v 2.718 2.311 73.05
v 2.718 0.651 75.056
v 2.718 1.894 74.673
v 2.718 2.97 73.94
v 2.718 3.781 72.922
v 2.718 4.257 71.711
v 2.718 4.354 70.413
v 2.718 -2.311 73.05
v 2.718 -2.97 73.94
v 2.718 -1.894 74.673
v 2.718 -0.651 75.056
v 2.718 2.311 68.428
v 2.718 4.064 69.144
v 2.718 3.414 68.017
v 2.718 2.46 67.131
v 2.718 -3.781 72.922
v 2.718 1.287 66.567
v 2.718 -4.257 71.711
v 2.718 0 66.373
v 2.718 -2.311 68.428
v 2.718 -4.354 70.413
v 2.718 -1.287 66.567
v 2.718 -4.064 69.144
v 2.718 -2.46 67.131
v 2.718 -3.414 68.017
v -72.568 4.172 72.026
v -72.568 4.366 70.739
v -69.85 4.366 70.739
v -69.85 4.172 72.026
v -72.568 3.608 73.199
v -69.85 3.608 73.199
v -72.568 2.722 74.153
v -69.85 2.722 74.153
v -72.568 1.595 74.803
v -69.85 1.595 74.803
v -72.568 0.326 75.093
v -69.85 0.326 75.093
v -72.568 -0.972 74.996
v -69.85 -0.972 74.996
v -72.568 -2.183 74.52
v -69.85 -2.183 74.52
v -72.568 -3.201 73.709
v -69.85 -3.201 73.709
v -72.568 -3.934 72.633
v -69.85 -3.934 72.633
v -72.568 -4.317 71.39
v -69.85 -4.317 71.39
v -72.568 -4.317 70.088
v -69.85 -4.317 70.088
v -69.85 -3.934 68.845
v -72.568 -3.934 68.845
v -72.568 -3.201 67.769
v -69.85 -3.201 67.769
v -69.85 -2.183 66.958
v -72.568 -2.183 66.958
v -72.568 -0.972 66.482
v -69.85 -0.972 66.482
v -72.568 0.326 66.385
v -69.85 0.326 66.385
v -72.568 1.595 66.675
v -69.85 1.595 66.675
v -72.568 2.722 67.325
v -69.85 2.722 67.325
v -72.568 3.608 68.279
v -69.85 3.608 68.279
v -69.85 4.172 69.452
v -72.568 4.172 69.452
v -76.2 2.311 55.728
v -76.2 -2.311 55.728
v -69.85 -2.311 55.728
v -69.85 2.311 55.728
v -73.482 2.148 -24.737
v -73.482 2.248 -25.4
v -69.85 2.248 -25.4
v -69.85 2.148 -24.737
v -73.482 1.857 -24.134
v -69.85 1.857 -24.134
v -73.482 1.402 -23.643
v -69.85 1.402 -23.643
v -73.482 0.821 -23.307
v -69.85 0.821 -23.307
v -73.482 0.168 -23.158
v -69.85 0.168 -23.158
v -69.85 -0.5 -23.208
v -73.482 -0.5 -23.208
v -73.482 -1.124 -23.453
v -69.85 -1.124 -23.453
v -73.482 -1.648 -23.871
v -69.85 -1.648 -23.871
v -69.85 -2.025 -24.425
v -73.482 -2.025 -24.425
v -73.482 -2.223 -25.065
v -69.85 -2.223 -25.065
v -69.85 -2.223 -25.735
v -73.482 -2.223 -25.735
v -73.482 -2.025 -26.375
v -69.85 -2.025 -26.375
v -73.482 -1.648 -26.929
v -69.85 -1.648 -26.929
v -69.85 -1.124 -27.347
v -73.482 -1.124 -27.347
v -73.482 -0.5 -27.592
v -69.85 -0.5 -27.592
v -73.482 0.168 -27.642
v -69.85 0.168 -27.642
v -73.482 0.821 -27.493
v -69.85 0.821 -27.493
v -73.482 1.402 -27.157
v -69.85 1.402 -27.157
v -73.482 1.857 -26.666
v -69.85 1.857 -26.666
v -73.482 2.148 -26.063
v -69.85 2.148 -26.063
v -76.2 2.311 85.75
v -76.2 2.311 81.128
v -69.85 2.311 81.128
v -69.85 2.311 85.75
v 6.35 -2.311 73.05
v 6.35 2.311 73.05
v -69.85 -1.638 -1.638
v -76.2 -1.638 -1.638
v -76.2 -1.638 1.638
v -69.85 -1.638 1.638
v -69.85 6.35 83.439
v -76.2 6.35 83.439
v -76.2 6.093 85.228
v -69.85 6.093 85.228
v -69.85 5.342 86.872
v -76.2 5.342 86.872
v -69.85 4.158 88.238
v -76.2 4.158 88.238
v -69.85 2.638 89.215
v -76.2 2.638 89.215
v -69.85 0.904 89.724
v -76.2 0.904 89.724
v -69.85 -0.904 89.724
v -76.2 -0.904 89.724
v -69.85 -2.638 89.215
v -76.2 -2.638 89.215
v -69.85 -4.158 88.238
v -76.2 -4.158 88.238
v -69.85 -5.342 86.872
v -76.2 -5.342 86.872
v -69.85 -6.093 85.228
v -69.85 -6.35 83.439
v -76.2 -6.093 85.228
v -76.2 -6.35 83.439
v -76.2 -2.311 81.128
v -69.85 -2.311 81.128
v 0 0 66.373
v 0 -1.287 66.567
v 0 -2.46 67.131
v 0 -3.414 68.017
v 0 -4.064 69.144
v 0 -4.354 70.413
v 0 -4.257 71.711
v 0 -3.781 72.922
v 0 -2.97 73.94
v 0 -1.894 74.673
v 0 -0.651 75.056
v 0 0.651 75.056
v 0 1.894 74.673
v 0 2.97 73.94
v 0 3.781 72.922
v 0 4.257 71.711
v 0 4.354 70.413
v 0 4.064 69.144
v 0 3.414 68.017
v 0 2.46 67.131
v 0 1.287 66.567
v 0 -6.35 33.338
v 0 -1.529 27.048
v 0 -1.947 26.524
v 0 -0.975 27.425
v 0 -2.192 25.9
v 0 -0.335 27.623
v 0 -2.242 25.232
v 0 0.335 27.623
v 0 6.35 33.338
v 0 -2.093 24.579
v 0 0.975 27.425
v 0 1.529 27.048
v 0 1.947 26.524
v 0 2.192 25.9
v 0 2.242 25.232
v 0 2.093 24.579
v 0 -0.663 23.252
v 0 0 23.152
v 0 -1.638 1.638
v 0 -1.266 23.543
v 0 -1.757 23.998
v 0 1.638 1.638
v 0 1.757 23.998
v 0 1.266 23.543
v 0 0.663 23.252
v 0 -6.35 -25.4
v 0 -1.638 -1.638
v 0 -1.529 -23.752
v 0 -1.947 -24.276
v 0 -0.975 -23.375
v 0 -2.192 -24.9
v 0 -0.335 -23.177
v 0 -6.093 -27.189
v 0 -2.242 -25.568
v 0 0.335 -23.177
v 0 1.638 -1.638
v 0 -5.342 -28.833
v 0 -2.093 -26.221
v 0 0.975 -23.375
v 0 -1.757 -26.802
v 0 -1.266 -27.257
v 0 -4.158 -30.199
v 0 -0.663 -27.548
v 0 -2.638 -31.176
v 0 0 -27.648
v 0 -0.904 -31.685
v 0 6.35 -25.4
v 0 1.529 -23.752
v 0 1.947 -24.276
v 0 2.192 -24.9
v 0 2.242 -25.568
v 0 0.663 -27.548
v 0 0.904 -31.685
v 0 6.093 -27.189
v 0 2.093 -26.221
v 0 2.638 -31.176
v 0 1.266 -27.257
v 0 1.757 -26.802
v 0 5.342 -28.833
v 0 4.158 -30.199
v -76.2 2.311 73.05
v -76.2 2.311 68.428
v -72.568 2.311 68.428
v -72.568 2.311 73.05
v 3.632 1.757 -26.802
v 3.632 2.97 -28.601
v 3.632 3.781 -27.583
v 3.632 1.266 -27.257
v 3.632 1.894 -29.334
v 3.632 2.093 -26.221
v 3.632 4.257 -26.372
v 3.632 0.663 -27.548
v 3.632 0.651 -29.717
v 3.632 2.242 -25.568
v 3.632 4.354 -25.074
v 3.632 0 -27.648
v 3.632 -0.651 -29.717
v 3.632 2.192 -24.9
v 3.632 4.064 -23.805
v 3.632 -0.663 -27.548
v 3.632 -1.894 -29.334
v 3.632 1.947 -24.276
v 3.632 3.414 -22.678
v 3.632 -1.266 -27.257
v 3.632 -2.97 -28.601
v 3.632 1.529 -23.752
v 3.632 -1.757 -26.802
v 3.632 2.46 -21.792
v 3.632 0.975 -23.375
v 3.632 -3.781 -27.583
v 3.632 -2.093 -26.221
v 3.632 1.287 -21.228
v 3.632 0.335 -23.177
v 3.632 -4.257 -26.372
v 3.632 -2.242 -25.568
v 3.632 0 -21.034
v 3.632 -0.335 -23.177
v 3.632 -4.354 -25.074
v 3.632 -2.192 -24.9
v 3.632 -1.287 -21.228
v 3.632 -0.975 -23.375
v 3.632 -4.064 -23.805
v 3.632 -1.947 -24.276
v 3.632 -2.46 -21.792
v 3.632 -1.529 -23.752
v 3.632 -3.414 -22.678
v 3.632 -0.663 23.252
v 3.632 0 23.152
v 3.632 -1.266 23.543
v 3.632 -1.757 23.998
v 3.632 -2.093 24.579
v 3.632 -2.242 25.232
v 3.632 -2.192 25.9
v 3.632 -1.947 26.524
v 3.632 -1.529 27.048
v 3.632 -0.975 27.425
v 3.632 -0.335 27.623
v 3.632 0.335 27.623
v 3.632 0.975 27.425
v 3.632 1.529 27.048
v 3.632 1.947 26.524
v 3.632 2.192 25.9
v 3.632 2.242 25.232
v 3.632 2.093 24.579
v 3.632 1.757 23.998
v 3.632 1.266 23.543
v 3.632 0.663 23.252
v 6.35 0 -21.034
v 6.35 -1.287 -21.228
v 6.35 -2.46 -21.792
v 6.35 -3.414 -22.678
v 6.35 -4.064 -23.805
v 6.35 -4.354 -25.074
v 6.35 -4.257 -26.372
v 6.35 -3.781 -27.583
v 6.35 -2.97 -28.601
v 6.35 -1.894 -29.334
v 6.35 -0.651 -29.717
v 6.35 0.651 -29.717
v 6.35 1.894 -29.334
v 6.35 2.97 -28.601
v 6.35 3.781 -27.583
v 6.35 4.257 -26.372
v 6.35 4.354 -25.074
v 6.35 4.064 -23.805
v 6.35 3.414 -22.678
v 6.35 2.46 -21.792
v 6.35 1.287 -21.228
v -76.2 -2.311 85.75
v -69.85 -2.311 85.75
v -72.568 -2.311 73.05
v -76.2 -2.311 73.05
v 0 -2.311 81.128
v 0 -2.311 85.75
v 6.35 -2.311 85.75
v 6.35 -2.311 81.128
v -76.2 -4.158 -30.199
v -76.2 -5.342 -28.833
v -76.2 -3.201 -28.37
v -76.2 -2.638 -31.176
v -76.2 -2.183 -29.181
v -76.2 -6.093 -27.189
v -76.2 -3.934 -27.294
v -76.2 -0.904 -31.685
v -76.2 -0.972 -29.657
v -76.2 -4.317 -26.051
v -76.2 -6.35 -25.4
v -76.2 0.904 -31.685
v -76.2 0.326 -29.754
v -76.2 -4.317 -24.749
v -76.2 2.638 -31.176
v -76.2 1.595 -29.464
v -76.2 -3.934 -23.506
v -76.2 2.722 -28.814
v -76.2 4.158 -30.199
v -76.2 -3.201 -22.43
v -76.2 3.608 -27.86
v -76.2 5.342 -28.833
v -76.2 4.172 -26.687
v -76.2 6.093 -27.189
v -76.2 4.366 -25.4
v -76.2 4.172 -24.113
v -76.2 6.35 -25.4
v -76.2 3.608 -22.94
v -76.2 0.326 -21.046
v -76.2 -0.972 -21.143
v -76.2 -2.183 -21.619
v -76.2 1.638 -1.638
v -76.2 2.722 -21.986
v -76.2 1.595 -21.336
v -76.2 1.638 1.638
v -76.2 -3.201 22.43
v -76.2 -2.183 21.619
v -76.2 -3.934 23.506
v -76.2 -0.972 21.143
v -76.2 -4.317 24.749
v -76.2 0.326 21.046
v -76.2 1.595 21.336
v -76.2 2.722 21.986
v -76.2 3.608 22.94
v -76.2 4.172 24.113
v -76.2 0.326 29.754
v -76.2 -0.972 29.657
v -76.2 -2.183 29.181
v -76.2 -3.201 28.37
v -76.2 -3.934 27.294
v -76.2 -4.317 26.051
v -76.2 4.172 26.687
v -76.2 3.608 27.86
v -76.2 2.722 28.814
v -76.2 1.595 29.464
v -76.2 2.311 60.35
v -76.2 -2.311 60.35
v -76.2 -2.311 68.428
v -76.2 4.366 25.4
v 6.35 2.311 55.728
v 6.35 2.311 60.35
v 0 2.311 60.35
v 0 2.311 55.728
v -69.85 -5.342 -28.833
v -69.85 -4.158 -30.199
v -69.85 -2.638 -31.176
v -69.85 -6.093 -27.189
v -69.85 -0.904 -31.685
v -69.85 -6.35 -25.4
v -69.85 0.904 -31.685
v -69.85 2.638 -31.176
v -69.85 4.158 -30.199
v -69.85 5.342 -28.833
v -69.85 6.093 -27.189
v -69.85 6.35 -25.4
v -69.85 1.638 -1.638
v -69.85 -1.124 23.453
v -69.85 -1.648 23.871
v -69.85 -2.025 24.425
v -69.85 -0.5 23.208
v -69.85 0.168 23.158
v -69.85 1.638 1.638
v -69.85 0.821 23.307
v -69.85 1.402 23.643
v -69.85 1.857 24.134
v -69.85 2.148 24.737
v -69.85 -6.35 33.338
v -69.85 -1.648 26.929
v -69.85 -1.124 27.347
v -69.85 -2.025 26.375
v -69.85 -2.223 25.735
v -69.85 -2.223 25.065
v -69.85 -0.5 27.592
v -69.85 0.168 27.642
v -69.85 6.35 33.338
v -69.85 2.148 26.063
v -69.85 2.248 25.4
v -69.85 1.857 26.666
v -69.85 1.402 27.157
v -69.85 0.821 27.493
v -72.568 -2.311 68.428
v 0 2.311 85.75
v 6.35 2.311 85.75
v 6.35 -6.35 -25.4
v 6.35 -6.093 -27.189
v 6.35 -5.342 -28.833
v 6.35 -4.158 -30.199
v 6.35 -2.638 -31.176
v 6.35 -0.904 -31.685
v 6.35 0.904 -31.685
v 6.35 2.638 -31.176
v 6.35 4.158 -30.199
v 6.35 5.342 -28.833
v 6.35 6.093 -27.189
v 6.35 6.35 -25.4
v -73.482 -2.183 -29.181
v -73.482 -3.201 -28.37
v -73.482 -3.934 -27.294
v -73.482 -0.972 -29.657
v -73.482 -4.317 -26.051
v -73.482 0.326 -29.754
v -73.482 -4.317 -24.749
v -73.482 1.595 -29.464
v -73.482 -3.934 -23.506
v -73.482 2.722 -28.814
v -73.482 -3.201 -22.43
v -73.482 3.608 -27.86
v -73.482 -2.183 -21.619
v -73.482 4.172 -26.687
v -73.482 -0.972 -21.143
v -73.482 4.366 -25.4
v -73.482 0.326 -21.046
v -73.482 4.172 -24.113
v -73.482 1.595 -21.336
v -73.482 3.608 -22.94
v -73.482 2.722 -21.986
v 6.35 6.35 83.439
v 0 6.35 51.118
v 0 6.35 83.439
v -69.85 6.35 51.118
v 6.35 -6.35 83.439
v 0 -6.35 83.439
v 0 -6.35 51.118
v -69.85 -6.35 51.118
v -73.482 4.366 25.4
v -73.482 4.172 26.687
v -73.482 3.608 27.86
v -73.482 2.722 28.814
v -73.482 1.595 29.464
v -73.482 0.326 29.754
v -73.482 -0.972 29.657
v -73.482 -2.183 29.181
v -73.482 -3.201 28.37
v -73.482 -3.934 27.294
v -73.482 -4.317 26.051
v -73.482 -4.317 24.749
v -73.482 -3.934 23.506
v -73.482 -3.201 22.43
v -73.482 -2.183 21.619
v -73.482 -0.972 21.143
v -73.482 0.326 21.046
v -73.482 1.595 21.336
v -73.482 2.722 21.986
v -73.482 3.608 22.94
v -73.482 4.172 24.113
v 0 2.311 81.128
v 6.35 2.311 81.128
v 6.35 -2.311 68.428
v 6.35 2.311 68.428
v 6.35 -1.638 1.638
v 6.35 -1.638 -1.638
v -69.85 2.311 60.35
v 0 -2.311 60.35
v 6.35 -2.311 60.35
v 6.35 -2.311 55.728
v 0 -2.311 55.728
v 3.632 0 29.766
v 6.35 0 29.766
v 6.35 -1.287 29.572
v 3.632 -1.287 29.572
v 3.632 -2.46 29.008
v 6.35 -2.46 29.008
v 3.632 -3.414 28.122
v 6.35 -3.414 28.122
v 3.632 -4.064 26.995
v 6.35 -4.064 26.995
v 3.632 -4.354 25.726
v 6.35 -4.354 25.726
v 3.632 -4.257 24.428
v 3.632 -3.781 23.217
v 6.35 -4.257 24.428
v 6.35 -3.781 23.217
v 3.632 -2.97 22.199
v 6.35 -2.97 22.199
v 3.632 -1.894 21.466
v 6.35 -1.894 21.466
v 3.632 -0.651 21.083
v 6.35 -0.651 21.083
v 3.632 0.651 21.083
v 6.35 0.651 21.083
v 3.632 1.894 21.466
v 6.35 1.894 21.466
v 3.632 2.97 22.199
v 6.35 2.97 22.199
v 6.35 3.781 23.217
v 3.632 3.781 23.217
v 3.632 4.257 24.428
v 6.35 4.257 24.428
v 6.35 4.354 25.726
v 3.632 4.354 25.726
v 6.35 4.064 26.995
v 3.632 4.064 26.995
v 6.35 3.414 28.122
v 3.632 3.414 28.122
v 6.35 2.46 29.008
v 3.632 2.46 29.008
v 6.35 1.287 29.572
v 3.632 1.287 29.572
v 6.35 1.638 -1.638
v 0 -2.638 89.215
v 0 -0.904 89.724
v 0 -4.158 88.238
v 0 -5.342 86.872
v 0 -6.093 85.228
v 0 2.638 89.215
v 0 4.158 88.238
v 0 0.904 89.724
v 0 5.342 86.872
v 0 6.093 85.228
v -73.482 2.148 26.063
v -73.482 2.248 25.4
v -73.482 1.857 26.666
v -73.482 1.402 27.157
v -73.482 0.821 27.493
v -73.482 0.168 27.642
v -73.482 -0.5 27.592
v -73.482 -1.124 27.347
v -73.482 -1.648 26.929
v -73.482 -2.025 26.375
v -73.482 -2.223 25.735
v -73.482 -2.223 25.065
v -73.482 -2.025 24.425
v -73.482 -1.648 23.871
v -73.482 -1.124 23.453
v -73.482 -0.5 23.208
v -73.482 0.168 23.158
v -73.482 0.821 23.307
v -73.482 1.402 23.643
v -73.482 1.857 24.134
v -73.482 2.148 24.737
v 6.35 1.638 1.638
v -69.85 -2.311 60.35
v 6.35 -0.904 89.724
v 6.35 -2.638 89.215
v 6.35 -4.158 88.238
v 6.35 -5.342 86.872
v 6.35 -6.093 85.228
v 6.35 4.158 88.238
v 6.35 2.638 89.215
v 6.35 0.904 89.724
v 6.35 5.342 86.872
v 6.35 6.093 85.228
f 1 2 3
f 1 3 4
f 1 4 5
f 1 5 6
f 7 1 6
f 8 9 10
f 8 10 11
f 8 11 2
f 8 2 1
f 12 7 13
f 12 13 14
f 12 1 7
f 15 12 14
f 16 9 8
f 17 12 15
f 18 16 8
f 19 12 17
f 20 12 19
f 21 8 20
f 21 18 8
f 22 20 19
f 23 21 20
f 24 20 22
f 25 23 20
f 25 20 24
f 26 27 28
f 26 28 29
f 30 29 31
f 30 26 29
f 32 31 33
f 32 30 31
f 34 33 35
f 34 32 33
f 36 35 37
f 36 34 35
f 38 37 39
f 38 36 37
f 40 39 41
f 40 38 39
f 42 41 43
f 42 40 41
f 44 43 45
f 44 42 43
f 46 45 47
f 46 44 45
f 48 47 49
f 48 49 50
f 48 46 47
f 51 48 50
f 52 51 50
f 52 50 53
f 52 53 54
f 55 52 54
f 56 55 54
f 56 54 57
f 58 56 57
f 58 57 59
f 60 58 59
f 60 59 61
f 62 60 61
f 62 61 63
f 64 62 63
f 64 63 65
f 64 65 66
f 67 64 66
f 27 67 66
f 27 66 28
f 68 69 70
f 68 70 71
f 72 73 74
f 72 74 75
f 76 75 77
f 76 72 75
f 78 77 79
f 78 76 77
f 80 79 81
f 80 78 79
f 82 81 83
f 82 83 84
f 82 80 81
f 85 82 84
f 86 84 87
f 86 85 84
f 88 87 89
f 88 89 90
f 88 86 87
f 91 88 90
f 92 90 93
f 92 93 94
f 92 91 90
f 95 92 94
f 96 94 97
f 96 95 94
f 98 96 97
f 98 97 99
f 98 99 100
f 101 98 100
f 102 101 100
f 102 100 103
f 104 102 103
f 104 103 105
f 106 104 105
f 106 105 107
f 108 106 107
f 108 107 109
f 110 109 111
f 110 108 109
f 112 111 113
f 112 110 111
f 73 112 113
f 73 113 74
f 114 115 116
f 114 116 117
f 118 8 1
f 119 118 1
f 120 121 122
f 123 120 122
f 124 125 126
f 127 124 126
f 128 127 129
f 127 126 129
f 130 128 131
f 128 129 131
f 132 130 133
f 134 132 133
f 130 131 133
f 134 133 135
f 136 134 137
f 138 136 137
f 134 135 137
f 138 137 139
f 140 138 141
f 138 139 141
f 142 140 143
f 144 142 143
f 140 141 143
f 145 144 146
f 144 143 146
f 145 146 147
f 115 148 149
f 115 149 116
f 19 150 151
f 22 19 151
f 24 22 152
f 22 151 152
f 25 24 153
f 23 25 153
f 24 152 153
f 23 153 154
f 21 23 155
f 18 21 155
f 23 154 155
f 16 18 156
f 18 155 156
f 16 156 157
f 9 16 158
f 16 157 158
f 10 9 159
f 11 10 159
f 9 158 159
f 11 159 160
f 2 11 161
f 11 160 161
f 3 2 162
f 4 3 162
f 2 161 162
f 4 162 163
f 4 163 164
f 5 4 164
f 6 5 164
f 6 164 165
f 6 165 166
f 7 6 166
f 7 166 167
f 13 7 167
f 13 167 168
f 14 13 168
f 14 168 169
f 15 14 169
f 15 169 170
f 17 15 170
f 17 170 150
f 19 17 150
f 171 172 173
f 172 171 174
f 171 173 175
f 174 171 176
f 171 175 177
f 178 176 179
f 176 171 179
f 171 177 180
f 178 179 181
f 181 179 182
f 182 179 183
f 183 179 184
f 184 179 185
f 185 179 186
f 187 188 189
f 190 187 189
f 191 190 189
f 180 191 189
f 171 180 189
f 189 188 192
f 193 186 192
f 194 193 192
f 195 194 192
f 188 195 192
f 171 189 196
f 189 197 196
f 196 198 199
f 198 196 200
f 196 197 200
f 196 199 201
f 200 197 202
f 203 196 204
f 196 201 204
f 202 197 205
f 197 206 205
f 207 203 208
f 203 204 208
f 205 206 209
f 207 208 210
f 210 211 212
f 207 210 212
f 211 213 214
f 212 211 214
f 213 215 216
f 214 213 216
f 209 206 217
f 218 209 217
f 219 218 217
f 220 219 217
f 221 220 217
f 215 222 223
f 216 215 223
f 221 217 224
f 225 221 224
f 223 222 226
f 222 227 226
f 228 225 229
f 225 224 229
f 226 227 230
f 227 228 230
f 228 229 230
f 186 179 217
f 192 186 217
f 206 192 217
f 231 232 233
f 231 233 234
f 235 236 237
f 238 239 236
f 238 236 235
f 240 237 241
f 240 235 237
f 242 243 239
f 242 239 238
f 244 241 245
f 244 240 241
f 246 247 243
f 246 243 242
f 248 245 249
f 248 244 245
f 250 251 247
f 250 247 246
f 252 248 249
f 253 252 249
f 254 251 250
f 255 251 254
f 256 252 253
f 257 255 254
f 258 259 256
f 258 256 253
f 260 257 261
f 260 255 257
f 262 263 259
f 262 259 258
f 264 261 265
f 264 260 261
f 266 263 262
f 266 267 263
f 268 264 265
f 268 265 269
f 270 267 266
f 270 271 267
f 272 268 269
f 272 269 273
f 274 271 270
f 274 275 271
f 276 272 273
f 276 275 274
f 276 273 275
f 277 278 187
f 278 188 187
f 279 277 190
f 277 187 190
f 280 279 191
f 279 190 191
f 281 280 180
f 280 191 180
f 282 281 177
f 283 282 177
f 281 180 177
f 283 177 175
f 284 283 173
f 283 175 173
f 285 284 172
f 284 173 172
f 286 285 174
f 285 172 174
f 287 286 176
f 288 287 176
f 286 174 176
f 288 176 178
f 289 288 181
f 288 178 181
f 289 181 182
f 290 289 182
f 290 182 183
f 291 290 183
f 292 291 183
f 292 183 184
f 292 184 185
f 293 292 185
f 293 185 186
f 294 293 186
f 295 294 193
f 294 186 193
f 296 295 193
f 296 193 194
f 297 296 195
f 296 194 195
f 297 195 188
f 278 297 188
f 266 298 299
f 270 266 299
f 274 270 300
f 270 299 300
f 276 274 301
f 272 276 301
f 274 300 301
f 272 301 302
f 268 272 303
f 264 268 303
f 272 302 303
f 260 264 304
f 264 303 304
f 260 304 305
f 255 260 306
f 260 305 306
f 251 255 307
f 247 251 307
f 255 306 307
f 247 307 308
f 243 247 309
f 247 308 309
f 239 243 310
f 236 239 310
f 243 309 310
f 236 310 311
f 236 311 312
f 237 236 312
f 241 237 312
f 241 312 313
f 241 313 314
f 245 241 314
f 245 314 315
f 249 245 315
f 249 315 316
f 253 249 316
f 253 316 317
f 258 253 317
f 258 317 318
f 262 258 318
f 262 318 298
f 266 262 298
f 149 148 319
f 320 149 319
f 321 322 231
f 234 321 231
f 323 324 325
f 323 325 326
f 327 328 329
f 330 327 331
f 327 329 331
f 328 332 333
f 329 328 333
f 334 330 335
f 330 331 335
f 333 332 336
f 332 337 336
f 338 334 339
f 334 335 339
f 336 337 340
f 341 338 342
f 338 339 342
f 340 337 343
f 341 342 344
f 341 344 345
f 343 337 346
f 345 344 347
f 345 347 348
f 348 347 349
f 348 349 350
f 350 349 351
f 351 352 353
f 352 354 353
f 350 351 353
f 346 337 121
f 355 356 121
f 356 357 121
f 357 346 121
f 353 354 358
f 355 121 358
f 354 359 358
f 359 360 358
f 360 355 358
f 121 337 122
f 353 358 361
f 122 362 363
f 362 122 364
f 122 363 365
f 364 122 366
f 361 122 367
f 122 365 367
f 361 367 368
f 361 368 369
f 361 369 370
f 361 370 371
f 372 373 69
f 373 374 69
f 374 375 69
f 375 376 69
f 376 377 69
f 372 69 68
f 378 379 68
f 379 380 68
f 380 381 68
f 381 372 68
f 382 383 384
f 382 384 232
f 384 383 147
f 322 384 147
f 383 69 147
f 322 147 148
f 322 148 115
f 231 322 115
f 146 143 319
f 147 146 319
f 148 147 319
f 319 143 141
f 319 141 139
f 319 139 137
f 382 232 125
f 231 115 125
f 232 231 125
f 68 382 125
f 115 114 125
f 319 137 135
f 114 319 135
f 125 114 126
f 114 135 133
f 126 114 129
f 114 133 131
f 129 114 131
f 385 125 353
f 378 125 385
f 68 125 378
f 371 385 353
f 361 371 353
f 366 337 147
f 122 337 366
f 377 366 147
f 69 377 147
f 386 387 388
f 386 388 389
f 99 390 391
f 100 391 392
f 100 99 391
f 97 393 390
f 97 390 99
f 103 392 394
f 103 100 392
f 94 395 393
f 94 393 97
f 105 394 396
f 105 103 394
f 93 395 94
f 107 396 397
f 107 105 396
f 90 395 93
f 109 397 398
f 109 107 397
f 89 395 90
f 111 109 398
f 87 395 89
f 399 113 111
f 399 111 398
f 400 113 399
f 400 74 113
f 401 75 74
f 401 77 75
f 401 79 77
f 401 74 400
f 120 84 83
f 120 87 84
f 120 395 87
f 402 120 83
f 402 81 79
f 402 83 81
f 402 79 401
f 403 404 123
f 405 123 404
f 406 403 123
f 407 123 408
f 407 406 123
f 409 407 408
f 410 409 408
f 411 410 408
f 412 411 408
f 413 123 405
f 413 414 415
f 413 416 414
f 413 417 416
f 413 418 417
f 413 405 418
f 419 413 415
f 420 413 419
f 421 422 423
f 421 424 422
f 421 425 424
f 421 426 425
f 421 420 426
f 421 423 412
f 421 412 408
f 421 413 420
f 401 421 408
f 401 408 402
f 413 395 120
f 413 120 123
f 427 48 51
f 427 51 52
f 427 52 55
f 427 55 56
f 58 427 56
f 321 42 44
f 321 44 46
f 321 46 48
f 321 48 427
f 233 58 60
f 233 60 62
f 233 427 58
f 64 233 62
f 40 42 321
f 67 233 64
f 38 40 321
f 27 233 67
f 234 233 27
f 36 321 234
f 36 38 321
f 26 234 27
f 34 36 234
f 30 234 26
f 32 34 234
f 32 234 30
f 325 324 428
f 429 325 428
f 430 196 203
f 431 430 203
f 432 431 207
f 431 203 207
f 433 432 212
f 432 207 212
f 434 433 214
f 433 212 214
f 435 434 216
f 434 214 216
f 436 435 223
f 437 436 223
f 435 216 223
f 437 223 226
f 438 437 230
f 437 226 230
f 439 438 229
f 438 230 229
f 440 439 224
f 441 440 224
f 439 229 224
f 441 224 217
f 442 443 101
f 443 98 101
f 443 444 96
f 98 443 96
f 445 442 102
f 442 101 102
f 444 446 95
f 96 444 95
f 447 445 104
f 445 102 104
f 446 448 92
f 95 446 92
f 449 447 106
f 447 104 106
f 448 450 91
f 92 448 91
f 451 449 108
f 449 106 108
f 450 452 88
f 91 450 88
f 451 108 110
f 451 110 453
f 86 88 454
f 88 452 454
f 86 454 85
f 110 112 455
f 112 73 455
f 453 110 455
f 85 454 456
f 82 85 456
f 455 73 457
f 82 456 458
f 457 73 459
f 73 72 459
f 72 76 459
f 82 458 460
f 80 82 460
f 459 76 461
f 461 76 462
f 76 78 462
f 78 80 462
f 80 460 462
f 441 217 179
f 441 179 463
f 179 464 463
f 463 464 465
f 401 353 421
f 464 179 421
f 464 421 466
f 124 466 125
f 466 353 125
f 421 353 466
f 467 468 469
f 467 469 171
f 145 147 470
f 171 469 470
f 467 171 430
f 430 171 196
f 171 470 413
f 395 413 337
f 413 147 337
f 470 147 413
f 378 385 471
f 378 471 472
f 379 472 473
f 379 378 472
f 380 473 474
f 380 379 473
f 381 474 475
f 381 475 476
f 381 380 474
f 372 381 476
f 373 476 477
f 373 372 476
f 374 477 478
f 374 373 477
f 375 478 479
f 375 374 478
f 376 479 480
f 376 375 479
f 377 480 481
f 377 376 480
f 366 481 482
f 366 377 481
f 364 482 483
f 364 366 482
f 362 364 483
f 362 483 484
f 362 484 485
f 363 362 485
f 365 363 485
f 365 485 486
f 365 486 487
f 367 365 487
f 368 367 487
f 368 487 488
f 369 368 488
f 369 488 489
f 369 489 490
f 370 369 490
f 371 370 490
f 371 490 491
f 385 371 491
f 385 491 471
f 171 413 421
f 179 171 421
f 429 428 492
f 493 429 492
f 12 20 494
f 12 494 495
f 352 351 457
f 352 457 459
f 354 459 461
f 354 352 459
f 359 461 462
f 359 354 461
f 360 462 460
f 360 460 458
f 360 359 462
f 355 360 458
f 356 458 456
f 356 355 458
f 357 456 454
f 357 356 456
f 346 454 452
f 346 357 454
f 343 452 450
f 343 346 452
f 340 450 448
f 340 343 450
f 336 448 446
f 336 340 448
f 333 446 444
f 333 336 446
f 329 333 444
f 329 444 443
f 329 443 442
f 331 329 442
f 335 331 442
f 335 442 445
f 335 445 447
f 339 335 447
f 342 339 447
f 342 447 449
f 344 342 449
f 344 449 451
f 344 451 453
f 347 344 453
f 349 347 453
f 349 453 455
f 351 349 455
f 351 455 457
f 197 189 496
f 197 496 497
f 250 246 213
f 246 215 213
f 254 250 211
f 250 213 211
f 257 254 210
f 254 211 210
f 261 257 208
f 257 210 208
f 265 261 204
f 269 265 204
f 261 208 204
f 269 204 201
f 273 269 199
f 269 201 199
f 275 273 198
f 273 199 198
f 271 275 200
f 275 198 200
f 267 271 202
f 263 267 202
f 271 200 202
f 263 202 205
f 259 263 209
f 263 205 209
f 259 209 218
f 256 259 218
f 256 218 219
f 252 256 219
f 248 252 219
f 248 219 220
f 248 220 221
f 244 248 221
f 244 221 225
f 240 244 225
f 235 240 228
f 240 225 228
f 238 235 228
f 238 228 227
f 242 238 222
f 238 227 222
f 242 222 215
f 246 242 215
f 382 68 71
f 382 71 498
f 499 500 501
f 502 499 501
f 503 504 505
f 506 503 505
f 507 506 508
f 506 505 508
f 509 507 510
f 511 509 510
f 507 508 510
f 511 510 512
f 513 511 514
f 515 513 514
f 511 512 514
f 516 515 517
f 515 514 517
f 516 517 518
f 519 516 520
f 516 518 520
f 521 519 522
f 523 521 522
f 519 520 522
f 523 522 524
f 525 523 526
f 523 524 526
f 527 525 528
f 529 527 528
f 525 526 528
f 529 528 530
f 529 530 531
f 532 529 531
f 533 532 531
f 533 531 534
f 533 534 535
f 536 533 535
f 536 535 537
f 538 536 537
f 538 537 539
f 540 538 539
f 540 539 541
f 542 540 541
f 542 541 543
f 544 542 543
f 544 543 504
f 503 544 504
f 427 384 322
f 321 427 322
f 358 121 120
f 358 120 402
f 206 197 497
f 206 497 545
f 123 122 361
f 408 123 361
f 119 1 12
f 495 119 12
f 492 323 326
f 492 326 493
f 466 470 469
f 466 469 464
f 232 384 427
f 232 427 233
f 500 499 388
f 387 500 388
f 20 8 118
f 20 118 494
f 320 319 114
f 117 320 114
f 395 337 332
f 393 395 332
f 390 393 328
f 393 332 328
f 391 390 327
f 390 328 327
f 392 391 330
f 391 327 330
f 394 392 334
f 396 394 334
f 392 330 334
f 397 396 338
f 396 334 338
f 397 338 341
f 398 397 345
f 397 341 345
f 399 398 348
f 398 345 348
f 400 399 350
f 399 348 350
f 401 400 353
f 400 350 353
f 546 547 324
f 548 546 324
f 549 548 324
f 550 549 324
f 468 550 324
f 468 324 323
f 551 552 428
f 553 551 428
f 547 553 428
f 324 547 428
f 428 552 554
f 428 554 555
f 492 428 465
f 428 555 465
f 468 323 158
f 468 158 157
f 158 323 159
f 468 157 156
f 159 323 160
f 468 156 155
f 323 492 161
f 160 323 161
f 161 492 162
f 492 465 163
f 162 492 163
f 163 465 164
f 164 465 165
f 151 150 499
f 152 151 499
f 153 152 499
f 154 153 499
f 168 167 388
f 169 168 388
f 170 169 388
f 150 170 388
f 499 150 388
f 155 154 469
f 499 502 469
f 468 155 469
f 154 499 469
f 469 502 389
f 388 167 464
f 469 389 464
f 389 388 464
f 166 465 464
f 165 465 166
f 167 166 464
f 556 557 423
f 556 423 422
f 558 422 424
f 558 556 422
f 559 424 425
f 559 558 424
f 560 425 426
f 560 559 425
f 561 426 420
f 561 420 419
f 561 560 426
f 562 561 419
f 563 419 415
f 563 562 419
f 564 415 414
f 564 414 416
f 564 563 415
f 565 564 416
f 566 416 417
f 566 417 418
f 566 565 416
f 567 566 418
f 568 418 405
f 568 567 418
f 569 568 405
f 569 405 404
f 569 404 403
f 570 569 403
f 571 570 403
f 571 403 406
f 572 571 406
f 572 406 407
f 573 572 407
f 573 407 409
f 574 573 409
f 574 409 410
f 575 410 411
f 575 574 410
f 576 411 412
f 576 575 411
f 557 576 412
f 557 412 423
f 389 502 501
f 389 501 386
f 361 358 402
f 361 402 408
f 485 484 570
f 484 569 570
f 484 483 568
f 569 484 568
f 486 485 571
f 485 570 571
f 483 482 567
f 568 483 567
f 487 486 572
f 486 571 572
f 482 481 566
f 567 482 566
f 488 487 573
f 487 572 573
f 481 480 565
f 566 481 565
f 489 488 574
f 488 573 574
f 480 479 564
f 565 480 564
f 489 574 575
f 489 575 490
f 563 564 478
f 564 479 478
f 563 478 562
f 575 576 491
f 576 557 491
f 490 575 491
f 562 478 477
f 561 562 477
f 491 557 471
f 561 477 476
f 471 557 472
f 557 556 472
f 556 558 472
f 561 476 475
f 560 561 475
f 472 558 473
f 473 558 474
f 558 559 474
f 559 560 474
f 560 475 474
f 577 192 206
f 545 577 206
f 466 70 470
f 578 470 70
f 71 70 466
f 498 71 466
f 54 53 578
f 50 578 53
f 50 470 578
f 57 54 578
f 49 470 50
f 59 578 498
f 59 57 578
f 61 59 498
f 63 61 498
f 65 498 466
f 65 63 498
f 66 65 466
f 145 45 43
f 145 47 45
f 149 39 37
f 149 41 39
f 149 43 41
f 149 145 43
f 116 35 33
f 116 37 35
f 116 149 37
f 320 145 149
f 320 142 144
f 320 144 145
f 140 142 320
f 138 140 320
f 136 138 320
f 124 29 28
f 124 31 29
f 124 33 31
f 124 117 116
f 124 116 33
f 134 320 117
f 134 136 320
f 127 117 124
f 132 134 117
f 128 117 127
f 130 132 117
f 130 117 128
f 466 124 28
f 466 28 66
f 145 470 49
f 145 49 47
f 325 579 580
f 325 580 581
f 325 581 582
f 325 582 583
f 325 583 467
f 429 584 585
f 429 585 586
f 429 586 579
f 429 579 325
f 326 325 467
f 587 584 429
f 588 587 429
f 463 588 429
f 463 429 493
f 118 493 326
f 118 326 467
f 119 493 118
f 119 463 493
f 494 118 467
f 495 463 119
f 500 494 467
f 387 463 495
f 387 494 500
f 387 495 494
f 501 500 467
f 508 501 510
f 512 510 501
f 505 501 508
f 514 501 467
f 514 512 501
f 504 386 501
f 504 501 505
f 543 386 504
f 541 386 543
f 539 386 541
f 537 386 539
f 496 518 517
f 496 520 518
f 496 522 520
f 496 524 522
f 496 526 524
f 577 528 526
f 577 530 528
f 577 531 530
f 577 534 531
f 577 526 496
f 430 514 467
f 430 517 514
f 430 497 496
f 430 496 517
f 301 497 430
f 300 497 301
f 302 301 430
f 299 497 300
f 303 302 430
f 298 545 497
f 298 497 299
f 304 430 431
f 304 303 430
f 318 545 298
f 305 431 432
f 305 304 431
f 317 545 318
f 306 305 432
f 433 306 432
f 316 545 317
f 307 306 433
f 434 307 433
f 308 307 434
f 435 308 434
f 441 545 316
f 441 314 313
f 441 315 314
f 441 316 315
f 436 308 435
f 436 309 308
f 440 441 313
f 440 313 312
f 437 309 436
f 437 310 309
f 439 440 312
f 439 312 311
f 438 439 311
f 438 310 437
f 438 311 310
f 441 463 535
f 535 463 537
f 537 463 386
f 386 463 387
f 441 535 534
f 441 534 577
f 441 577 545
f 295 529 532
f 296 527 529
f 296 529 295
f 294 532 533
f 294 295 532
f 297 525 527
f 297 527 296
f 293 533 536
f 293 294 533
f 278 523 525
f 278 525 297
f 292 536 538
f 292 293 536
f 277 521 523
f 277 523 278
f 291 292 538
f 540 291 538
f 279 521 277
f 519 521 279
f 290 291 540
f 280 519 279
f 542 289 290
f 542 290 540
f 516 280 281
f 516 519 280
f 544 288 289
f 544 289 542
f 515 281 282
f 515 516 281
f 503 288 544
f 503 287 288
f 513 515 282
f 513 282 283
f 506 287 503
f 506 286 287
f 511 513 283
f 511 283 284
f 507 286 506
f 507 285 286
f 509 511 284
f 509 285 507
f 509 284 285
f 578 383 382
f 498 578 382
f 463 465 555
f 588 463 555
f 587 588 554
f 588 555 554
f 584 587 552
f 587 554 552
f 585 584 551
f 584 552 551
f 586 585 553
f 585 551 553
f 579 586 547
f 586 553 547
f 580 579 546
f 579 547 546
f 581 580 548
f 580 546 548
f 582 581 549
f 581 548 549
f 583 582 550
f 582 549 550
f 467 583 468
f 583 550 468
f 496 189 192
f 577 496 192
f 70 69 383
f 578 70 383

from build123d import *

# Parameters (mm, degrees)
SKETCH1_W                                      = 3.275
SKETCH1_H                                      = 3.275
SKETCH1_W_2                                    = 4.6228
SKETCH1_H_2                                    = 4.6228
BOSS_EXTRUDE1_DEPTH                            = 6.35
CBORE_FOR_8_BUTTON_HEAD_CAP_SCREW1_D           = 4.4958
CBORE_FOR_8_BUTTON_HEAD_CAP_SCREW1_CBORE_D     = 8.73252
CBORE_FOR_8_BUTTON_HEAD_CAP_SCREW1_CBORE_DEPTH = 2.7178
CBORE_FOR_8_BUTTON_HEAD_CAP_SCREW2_D           = 4.4958
CBORE_FOR_8_BUTTON_HEAD_CAP_SCREW2_CBORE_D     = 8.73252
CBORE_FOR_8_BUTTON_HEAD_CAP_SCREW2_CBORE_DEPTH = 2.7178
SKETCH10_W                                     = 17.78
SKETCH10_H                                     = 12.7
BOSS_EXTRUDE2_DEPTH                            = 38.1
MIRROR5_START                                  = -76.2
MIRROR5_OUTLINE_R                              = 4.36626
MIRROR5_OUTLINE_W                              = 3.275
MIRROR5_OUTLINE_H                              = 3.275
MIRROR5_OUTLINE_W_2                            = 4.6228
MIRROR5_OUTLINE_H_2                            = 4.6228
MIRROR5_DEPTH                                  = 6.35
MIRROR5_START_2                                = -73.4822
MIRROR5_2_OUTLINE_R                            = 4.36626
MIRROR5_2_OUTLINE_R_2                          = 2.2479
MIRROR5_2_DEPTH                                = 3.6322
MIRROR5_3_OUTLINE_R                            = 4.36626
MIRROR5_3_OUTLINE_W                            = 4.6228
MIRROR5_3_OUTLINE_H                            = 4.6228
MIRROR5_3_DEPTH                                = 3.6322


# Read off the part's stored shape, not the designer's step: Mirror5
with BuildPart() as part:
    # Sketch1 → Boss-Extrude1 (new body)
    with BuildSketch(Plane(origin=(0, 0, 0), x_dir=(0, 0, -1), z_dir=(1, 0, 0))):
        with BuildLine():
            Line((-83.439, -6.35), (25.4, -6.35))
            ThreePointArc((25.4, -6.35), (31.75, 0), (25.4, 6.35))
            Line((25.4, 6.35), (-83.439, 6.35))
            ThreePointArc((-83.439, 6.35), (-89.789, 0), (-83.439, -6.35))
        make_face()
        Rectangle(SKETCH1_W, SKETCH1_H, mode=Mode.SUBTRACT)
        with Locations((-83.439, 0)):
            Rectangle(SKETCH1_W_2, SKETCH1_H_2, mode=Mode.SUBTRACT)
        with Locations((-58.039, 0)):
            Rectangle(SKETCH1_W_2, SKETCH1_H_2, mode=Mode.SUBTRACT)
        with Locations((-70.739, 0)):
            Rectangle(SKETCH1_W_2, SKETCH1_H_2, mode=Mode.SUBTRACT)
    extrude(amount=BOSS_EXTRUDE1_DEPTH)

    # CBORE for #8 Button Head Cap Screw1 (through all)
    with Locations(Plane(origin=(6.35, 0, 25.4), x_dir=(0, 0, 1), z_dir=(1, 0, 0))):
        with Locations((0, 0), (-50.8, 0)):
            CounterBoreHole(CBORE_FOR_8_BUTTON_HEAD_CAP_SCREW1_D / 2, CBORE_FOR_8_BUTTON_HEAD_CAP_SCREW1_CBORE_D / 2, CBORE_FOR_8_BUTTON_HEAD_CAP_SCREW1_CBORE_DEPTH)

    # CBORE for #8 Button Head Cap Screw2 (through all)
    with Locations(Plane(origin=(0, 0, 70.739), x_dir=(0, 0, -1), z_dir=(-1, 0, 0))):
        with Locations((0, 0)):
            CounterBoreHole(CBORE_FOR_8_BUTTON_HEAD_CAP_SCREW2_D / 2, CBORE_FOR_8_BUTTON_HEAD_CAP_SCREW2_CBORE_D / 2, CBORE_FOR_8_BUTTON_HEAD_CAP_SCREW2_CBORE_DEPTH)

    # Sketch10 → Boss-Extrude2 (add)
    with BuildSketch(Plane.ZY):
        with Locations((42.2275, 0)):
            Rectangle(SKETCH10_W, SKETCH10_H)
    boss_extrude2 = extrude(amount=BOSS_EXTRUDE2_DEPTH)

    # Mirror4: Boss-Extrude2 across plane
    add(boss_extrude2.mirror(Plane.ZY.offset(34.925)))

    # Mirror5 outline → Mirror5 (add)
    with BuildSketch(Plane.YZ.offset(MIRROR5_START)):
        with BuildLine():
            Line((6.35, -25.4), (6.35, 83.439))
            ThreePointArc((6.35, 83.439), (0, 89.789), (-6.35, 83.439))
            Line((-6.35, 83.439), (-6.35, -25.4))
            ThreePointArc((-6.35, -25.4), (0, -31.75), (6.35, -25.4))
        make_face()
        with Locations((0, -25.4)):
            Circle(MIRROR5_OUTLINE_R, mode=Mode.SUBTRACT)
        Rectangle(MIRROR5_OUTLINE_W, MIRROR5_OUTLINE_H, mode=Mode.SUBTRACT)
        with Locations((0, 25.4)):
            Circle(MIRROR5_OUTLINE_R, mode=Mode.SUBTRACT)
        with Locations((0, 58.039)):
            Rectangle(MIRROR5_OUTLINE_W_2, MIRROR5_OUTLINE_H_2, mode=Mode.SUBTRACT)
        with Locations((0, 70.739)):
            Circle(MIRROR5_OUTLINE_R, mode=Mode.SUBTRACT)
        with Locations((0, 83.439)):
            Rectangle(MIRROR5_OUTLINE_W_2, MIRROR5_OUTLINE_H_2, mode=Mode.SUBTRACT)
    extrude(amount=MIRROR5_DEPTH)

    # Mirror5 2 outline → Mirror5 2 (add)
    # profile 1 of 2: a face of its own
    with BuildSketch(Plane.YZ.offset(MIRROR5_START_2)):
        with Locations((0, -25.4)):
            Circle(MIRROR5_2_OUTLINE_R)
        with Locations((0, -25.4)):
            Circle(MIRROR5_2_OUTLINE_R_2, mode=Mode.SUBTRACT)
    # profile 2 of 2: a face of its own
    with BuildSketch(Plane.YZ.offset(MIRROR5_START_2)):
        with Locations((0, 25.4)):
            Circle(MIRROR5_2_OUTLINE_R)
        with Locations((0, 25.4)):
            Circle(MIRROR5_2_OUTLINE_R_2, mode=Mode.SUBTRACT)
    extrude(amount=MIRROR5_2_DEPTH)

    # Mirror5 3 outline → Mirror5 3 (add)
    with BuildSketch(Plane.YZ.offset(MIRROR5_START)):
        with Locations((0, 70.739)):
            Circle(MIRROR5_3_OUTLINE_R)
        with Locations((0, 70.739)):
            Rectangle(MIRROR5_3_OUTLINE_W, MIRROR5_3_OUTLINE_H, mode=Mode.SUBTRACT)
    extrude(amount=MIRROR5_3_DEPTH)


solid = part.part
